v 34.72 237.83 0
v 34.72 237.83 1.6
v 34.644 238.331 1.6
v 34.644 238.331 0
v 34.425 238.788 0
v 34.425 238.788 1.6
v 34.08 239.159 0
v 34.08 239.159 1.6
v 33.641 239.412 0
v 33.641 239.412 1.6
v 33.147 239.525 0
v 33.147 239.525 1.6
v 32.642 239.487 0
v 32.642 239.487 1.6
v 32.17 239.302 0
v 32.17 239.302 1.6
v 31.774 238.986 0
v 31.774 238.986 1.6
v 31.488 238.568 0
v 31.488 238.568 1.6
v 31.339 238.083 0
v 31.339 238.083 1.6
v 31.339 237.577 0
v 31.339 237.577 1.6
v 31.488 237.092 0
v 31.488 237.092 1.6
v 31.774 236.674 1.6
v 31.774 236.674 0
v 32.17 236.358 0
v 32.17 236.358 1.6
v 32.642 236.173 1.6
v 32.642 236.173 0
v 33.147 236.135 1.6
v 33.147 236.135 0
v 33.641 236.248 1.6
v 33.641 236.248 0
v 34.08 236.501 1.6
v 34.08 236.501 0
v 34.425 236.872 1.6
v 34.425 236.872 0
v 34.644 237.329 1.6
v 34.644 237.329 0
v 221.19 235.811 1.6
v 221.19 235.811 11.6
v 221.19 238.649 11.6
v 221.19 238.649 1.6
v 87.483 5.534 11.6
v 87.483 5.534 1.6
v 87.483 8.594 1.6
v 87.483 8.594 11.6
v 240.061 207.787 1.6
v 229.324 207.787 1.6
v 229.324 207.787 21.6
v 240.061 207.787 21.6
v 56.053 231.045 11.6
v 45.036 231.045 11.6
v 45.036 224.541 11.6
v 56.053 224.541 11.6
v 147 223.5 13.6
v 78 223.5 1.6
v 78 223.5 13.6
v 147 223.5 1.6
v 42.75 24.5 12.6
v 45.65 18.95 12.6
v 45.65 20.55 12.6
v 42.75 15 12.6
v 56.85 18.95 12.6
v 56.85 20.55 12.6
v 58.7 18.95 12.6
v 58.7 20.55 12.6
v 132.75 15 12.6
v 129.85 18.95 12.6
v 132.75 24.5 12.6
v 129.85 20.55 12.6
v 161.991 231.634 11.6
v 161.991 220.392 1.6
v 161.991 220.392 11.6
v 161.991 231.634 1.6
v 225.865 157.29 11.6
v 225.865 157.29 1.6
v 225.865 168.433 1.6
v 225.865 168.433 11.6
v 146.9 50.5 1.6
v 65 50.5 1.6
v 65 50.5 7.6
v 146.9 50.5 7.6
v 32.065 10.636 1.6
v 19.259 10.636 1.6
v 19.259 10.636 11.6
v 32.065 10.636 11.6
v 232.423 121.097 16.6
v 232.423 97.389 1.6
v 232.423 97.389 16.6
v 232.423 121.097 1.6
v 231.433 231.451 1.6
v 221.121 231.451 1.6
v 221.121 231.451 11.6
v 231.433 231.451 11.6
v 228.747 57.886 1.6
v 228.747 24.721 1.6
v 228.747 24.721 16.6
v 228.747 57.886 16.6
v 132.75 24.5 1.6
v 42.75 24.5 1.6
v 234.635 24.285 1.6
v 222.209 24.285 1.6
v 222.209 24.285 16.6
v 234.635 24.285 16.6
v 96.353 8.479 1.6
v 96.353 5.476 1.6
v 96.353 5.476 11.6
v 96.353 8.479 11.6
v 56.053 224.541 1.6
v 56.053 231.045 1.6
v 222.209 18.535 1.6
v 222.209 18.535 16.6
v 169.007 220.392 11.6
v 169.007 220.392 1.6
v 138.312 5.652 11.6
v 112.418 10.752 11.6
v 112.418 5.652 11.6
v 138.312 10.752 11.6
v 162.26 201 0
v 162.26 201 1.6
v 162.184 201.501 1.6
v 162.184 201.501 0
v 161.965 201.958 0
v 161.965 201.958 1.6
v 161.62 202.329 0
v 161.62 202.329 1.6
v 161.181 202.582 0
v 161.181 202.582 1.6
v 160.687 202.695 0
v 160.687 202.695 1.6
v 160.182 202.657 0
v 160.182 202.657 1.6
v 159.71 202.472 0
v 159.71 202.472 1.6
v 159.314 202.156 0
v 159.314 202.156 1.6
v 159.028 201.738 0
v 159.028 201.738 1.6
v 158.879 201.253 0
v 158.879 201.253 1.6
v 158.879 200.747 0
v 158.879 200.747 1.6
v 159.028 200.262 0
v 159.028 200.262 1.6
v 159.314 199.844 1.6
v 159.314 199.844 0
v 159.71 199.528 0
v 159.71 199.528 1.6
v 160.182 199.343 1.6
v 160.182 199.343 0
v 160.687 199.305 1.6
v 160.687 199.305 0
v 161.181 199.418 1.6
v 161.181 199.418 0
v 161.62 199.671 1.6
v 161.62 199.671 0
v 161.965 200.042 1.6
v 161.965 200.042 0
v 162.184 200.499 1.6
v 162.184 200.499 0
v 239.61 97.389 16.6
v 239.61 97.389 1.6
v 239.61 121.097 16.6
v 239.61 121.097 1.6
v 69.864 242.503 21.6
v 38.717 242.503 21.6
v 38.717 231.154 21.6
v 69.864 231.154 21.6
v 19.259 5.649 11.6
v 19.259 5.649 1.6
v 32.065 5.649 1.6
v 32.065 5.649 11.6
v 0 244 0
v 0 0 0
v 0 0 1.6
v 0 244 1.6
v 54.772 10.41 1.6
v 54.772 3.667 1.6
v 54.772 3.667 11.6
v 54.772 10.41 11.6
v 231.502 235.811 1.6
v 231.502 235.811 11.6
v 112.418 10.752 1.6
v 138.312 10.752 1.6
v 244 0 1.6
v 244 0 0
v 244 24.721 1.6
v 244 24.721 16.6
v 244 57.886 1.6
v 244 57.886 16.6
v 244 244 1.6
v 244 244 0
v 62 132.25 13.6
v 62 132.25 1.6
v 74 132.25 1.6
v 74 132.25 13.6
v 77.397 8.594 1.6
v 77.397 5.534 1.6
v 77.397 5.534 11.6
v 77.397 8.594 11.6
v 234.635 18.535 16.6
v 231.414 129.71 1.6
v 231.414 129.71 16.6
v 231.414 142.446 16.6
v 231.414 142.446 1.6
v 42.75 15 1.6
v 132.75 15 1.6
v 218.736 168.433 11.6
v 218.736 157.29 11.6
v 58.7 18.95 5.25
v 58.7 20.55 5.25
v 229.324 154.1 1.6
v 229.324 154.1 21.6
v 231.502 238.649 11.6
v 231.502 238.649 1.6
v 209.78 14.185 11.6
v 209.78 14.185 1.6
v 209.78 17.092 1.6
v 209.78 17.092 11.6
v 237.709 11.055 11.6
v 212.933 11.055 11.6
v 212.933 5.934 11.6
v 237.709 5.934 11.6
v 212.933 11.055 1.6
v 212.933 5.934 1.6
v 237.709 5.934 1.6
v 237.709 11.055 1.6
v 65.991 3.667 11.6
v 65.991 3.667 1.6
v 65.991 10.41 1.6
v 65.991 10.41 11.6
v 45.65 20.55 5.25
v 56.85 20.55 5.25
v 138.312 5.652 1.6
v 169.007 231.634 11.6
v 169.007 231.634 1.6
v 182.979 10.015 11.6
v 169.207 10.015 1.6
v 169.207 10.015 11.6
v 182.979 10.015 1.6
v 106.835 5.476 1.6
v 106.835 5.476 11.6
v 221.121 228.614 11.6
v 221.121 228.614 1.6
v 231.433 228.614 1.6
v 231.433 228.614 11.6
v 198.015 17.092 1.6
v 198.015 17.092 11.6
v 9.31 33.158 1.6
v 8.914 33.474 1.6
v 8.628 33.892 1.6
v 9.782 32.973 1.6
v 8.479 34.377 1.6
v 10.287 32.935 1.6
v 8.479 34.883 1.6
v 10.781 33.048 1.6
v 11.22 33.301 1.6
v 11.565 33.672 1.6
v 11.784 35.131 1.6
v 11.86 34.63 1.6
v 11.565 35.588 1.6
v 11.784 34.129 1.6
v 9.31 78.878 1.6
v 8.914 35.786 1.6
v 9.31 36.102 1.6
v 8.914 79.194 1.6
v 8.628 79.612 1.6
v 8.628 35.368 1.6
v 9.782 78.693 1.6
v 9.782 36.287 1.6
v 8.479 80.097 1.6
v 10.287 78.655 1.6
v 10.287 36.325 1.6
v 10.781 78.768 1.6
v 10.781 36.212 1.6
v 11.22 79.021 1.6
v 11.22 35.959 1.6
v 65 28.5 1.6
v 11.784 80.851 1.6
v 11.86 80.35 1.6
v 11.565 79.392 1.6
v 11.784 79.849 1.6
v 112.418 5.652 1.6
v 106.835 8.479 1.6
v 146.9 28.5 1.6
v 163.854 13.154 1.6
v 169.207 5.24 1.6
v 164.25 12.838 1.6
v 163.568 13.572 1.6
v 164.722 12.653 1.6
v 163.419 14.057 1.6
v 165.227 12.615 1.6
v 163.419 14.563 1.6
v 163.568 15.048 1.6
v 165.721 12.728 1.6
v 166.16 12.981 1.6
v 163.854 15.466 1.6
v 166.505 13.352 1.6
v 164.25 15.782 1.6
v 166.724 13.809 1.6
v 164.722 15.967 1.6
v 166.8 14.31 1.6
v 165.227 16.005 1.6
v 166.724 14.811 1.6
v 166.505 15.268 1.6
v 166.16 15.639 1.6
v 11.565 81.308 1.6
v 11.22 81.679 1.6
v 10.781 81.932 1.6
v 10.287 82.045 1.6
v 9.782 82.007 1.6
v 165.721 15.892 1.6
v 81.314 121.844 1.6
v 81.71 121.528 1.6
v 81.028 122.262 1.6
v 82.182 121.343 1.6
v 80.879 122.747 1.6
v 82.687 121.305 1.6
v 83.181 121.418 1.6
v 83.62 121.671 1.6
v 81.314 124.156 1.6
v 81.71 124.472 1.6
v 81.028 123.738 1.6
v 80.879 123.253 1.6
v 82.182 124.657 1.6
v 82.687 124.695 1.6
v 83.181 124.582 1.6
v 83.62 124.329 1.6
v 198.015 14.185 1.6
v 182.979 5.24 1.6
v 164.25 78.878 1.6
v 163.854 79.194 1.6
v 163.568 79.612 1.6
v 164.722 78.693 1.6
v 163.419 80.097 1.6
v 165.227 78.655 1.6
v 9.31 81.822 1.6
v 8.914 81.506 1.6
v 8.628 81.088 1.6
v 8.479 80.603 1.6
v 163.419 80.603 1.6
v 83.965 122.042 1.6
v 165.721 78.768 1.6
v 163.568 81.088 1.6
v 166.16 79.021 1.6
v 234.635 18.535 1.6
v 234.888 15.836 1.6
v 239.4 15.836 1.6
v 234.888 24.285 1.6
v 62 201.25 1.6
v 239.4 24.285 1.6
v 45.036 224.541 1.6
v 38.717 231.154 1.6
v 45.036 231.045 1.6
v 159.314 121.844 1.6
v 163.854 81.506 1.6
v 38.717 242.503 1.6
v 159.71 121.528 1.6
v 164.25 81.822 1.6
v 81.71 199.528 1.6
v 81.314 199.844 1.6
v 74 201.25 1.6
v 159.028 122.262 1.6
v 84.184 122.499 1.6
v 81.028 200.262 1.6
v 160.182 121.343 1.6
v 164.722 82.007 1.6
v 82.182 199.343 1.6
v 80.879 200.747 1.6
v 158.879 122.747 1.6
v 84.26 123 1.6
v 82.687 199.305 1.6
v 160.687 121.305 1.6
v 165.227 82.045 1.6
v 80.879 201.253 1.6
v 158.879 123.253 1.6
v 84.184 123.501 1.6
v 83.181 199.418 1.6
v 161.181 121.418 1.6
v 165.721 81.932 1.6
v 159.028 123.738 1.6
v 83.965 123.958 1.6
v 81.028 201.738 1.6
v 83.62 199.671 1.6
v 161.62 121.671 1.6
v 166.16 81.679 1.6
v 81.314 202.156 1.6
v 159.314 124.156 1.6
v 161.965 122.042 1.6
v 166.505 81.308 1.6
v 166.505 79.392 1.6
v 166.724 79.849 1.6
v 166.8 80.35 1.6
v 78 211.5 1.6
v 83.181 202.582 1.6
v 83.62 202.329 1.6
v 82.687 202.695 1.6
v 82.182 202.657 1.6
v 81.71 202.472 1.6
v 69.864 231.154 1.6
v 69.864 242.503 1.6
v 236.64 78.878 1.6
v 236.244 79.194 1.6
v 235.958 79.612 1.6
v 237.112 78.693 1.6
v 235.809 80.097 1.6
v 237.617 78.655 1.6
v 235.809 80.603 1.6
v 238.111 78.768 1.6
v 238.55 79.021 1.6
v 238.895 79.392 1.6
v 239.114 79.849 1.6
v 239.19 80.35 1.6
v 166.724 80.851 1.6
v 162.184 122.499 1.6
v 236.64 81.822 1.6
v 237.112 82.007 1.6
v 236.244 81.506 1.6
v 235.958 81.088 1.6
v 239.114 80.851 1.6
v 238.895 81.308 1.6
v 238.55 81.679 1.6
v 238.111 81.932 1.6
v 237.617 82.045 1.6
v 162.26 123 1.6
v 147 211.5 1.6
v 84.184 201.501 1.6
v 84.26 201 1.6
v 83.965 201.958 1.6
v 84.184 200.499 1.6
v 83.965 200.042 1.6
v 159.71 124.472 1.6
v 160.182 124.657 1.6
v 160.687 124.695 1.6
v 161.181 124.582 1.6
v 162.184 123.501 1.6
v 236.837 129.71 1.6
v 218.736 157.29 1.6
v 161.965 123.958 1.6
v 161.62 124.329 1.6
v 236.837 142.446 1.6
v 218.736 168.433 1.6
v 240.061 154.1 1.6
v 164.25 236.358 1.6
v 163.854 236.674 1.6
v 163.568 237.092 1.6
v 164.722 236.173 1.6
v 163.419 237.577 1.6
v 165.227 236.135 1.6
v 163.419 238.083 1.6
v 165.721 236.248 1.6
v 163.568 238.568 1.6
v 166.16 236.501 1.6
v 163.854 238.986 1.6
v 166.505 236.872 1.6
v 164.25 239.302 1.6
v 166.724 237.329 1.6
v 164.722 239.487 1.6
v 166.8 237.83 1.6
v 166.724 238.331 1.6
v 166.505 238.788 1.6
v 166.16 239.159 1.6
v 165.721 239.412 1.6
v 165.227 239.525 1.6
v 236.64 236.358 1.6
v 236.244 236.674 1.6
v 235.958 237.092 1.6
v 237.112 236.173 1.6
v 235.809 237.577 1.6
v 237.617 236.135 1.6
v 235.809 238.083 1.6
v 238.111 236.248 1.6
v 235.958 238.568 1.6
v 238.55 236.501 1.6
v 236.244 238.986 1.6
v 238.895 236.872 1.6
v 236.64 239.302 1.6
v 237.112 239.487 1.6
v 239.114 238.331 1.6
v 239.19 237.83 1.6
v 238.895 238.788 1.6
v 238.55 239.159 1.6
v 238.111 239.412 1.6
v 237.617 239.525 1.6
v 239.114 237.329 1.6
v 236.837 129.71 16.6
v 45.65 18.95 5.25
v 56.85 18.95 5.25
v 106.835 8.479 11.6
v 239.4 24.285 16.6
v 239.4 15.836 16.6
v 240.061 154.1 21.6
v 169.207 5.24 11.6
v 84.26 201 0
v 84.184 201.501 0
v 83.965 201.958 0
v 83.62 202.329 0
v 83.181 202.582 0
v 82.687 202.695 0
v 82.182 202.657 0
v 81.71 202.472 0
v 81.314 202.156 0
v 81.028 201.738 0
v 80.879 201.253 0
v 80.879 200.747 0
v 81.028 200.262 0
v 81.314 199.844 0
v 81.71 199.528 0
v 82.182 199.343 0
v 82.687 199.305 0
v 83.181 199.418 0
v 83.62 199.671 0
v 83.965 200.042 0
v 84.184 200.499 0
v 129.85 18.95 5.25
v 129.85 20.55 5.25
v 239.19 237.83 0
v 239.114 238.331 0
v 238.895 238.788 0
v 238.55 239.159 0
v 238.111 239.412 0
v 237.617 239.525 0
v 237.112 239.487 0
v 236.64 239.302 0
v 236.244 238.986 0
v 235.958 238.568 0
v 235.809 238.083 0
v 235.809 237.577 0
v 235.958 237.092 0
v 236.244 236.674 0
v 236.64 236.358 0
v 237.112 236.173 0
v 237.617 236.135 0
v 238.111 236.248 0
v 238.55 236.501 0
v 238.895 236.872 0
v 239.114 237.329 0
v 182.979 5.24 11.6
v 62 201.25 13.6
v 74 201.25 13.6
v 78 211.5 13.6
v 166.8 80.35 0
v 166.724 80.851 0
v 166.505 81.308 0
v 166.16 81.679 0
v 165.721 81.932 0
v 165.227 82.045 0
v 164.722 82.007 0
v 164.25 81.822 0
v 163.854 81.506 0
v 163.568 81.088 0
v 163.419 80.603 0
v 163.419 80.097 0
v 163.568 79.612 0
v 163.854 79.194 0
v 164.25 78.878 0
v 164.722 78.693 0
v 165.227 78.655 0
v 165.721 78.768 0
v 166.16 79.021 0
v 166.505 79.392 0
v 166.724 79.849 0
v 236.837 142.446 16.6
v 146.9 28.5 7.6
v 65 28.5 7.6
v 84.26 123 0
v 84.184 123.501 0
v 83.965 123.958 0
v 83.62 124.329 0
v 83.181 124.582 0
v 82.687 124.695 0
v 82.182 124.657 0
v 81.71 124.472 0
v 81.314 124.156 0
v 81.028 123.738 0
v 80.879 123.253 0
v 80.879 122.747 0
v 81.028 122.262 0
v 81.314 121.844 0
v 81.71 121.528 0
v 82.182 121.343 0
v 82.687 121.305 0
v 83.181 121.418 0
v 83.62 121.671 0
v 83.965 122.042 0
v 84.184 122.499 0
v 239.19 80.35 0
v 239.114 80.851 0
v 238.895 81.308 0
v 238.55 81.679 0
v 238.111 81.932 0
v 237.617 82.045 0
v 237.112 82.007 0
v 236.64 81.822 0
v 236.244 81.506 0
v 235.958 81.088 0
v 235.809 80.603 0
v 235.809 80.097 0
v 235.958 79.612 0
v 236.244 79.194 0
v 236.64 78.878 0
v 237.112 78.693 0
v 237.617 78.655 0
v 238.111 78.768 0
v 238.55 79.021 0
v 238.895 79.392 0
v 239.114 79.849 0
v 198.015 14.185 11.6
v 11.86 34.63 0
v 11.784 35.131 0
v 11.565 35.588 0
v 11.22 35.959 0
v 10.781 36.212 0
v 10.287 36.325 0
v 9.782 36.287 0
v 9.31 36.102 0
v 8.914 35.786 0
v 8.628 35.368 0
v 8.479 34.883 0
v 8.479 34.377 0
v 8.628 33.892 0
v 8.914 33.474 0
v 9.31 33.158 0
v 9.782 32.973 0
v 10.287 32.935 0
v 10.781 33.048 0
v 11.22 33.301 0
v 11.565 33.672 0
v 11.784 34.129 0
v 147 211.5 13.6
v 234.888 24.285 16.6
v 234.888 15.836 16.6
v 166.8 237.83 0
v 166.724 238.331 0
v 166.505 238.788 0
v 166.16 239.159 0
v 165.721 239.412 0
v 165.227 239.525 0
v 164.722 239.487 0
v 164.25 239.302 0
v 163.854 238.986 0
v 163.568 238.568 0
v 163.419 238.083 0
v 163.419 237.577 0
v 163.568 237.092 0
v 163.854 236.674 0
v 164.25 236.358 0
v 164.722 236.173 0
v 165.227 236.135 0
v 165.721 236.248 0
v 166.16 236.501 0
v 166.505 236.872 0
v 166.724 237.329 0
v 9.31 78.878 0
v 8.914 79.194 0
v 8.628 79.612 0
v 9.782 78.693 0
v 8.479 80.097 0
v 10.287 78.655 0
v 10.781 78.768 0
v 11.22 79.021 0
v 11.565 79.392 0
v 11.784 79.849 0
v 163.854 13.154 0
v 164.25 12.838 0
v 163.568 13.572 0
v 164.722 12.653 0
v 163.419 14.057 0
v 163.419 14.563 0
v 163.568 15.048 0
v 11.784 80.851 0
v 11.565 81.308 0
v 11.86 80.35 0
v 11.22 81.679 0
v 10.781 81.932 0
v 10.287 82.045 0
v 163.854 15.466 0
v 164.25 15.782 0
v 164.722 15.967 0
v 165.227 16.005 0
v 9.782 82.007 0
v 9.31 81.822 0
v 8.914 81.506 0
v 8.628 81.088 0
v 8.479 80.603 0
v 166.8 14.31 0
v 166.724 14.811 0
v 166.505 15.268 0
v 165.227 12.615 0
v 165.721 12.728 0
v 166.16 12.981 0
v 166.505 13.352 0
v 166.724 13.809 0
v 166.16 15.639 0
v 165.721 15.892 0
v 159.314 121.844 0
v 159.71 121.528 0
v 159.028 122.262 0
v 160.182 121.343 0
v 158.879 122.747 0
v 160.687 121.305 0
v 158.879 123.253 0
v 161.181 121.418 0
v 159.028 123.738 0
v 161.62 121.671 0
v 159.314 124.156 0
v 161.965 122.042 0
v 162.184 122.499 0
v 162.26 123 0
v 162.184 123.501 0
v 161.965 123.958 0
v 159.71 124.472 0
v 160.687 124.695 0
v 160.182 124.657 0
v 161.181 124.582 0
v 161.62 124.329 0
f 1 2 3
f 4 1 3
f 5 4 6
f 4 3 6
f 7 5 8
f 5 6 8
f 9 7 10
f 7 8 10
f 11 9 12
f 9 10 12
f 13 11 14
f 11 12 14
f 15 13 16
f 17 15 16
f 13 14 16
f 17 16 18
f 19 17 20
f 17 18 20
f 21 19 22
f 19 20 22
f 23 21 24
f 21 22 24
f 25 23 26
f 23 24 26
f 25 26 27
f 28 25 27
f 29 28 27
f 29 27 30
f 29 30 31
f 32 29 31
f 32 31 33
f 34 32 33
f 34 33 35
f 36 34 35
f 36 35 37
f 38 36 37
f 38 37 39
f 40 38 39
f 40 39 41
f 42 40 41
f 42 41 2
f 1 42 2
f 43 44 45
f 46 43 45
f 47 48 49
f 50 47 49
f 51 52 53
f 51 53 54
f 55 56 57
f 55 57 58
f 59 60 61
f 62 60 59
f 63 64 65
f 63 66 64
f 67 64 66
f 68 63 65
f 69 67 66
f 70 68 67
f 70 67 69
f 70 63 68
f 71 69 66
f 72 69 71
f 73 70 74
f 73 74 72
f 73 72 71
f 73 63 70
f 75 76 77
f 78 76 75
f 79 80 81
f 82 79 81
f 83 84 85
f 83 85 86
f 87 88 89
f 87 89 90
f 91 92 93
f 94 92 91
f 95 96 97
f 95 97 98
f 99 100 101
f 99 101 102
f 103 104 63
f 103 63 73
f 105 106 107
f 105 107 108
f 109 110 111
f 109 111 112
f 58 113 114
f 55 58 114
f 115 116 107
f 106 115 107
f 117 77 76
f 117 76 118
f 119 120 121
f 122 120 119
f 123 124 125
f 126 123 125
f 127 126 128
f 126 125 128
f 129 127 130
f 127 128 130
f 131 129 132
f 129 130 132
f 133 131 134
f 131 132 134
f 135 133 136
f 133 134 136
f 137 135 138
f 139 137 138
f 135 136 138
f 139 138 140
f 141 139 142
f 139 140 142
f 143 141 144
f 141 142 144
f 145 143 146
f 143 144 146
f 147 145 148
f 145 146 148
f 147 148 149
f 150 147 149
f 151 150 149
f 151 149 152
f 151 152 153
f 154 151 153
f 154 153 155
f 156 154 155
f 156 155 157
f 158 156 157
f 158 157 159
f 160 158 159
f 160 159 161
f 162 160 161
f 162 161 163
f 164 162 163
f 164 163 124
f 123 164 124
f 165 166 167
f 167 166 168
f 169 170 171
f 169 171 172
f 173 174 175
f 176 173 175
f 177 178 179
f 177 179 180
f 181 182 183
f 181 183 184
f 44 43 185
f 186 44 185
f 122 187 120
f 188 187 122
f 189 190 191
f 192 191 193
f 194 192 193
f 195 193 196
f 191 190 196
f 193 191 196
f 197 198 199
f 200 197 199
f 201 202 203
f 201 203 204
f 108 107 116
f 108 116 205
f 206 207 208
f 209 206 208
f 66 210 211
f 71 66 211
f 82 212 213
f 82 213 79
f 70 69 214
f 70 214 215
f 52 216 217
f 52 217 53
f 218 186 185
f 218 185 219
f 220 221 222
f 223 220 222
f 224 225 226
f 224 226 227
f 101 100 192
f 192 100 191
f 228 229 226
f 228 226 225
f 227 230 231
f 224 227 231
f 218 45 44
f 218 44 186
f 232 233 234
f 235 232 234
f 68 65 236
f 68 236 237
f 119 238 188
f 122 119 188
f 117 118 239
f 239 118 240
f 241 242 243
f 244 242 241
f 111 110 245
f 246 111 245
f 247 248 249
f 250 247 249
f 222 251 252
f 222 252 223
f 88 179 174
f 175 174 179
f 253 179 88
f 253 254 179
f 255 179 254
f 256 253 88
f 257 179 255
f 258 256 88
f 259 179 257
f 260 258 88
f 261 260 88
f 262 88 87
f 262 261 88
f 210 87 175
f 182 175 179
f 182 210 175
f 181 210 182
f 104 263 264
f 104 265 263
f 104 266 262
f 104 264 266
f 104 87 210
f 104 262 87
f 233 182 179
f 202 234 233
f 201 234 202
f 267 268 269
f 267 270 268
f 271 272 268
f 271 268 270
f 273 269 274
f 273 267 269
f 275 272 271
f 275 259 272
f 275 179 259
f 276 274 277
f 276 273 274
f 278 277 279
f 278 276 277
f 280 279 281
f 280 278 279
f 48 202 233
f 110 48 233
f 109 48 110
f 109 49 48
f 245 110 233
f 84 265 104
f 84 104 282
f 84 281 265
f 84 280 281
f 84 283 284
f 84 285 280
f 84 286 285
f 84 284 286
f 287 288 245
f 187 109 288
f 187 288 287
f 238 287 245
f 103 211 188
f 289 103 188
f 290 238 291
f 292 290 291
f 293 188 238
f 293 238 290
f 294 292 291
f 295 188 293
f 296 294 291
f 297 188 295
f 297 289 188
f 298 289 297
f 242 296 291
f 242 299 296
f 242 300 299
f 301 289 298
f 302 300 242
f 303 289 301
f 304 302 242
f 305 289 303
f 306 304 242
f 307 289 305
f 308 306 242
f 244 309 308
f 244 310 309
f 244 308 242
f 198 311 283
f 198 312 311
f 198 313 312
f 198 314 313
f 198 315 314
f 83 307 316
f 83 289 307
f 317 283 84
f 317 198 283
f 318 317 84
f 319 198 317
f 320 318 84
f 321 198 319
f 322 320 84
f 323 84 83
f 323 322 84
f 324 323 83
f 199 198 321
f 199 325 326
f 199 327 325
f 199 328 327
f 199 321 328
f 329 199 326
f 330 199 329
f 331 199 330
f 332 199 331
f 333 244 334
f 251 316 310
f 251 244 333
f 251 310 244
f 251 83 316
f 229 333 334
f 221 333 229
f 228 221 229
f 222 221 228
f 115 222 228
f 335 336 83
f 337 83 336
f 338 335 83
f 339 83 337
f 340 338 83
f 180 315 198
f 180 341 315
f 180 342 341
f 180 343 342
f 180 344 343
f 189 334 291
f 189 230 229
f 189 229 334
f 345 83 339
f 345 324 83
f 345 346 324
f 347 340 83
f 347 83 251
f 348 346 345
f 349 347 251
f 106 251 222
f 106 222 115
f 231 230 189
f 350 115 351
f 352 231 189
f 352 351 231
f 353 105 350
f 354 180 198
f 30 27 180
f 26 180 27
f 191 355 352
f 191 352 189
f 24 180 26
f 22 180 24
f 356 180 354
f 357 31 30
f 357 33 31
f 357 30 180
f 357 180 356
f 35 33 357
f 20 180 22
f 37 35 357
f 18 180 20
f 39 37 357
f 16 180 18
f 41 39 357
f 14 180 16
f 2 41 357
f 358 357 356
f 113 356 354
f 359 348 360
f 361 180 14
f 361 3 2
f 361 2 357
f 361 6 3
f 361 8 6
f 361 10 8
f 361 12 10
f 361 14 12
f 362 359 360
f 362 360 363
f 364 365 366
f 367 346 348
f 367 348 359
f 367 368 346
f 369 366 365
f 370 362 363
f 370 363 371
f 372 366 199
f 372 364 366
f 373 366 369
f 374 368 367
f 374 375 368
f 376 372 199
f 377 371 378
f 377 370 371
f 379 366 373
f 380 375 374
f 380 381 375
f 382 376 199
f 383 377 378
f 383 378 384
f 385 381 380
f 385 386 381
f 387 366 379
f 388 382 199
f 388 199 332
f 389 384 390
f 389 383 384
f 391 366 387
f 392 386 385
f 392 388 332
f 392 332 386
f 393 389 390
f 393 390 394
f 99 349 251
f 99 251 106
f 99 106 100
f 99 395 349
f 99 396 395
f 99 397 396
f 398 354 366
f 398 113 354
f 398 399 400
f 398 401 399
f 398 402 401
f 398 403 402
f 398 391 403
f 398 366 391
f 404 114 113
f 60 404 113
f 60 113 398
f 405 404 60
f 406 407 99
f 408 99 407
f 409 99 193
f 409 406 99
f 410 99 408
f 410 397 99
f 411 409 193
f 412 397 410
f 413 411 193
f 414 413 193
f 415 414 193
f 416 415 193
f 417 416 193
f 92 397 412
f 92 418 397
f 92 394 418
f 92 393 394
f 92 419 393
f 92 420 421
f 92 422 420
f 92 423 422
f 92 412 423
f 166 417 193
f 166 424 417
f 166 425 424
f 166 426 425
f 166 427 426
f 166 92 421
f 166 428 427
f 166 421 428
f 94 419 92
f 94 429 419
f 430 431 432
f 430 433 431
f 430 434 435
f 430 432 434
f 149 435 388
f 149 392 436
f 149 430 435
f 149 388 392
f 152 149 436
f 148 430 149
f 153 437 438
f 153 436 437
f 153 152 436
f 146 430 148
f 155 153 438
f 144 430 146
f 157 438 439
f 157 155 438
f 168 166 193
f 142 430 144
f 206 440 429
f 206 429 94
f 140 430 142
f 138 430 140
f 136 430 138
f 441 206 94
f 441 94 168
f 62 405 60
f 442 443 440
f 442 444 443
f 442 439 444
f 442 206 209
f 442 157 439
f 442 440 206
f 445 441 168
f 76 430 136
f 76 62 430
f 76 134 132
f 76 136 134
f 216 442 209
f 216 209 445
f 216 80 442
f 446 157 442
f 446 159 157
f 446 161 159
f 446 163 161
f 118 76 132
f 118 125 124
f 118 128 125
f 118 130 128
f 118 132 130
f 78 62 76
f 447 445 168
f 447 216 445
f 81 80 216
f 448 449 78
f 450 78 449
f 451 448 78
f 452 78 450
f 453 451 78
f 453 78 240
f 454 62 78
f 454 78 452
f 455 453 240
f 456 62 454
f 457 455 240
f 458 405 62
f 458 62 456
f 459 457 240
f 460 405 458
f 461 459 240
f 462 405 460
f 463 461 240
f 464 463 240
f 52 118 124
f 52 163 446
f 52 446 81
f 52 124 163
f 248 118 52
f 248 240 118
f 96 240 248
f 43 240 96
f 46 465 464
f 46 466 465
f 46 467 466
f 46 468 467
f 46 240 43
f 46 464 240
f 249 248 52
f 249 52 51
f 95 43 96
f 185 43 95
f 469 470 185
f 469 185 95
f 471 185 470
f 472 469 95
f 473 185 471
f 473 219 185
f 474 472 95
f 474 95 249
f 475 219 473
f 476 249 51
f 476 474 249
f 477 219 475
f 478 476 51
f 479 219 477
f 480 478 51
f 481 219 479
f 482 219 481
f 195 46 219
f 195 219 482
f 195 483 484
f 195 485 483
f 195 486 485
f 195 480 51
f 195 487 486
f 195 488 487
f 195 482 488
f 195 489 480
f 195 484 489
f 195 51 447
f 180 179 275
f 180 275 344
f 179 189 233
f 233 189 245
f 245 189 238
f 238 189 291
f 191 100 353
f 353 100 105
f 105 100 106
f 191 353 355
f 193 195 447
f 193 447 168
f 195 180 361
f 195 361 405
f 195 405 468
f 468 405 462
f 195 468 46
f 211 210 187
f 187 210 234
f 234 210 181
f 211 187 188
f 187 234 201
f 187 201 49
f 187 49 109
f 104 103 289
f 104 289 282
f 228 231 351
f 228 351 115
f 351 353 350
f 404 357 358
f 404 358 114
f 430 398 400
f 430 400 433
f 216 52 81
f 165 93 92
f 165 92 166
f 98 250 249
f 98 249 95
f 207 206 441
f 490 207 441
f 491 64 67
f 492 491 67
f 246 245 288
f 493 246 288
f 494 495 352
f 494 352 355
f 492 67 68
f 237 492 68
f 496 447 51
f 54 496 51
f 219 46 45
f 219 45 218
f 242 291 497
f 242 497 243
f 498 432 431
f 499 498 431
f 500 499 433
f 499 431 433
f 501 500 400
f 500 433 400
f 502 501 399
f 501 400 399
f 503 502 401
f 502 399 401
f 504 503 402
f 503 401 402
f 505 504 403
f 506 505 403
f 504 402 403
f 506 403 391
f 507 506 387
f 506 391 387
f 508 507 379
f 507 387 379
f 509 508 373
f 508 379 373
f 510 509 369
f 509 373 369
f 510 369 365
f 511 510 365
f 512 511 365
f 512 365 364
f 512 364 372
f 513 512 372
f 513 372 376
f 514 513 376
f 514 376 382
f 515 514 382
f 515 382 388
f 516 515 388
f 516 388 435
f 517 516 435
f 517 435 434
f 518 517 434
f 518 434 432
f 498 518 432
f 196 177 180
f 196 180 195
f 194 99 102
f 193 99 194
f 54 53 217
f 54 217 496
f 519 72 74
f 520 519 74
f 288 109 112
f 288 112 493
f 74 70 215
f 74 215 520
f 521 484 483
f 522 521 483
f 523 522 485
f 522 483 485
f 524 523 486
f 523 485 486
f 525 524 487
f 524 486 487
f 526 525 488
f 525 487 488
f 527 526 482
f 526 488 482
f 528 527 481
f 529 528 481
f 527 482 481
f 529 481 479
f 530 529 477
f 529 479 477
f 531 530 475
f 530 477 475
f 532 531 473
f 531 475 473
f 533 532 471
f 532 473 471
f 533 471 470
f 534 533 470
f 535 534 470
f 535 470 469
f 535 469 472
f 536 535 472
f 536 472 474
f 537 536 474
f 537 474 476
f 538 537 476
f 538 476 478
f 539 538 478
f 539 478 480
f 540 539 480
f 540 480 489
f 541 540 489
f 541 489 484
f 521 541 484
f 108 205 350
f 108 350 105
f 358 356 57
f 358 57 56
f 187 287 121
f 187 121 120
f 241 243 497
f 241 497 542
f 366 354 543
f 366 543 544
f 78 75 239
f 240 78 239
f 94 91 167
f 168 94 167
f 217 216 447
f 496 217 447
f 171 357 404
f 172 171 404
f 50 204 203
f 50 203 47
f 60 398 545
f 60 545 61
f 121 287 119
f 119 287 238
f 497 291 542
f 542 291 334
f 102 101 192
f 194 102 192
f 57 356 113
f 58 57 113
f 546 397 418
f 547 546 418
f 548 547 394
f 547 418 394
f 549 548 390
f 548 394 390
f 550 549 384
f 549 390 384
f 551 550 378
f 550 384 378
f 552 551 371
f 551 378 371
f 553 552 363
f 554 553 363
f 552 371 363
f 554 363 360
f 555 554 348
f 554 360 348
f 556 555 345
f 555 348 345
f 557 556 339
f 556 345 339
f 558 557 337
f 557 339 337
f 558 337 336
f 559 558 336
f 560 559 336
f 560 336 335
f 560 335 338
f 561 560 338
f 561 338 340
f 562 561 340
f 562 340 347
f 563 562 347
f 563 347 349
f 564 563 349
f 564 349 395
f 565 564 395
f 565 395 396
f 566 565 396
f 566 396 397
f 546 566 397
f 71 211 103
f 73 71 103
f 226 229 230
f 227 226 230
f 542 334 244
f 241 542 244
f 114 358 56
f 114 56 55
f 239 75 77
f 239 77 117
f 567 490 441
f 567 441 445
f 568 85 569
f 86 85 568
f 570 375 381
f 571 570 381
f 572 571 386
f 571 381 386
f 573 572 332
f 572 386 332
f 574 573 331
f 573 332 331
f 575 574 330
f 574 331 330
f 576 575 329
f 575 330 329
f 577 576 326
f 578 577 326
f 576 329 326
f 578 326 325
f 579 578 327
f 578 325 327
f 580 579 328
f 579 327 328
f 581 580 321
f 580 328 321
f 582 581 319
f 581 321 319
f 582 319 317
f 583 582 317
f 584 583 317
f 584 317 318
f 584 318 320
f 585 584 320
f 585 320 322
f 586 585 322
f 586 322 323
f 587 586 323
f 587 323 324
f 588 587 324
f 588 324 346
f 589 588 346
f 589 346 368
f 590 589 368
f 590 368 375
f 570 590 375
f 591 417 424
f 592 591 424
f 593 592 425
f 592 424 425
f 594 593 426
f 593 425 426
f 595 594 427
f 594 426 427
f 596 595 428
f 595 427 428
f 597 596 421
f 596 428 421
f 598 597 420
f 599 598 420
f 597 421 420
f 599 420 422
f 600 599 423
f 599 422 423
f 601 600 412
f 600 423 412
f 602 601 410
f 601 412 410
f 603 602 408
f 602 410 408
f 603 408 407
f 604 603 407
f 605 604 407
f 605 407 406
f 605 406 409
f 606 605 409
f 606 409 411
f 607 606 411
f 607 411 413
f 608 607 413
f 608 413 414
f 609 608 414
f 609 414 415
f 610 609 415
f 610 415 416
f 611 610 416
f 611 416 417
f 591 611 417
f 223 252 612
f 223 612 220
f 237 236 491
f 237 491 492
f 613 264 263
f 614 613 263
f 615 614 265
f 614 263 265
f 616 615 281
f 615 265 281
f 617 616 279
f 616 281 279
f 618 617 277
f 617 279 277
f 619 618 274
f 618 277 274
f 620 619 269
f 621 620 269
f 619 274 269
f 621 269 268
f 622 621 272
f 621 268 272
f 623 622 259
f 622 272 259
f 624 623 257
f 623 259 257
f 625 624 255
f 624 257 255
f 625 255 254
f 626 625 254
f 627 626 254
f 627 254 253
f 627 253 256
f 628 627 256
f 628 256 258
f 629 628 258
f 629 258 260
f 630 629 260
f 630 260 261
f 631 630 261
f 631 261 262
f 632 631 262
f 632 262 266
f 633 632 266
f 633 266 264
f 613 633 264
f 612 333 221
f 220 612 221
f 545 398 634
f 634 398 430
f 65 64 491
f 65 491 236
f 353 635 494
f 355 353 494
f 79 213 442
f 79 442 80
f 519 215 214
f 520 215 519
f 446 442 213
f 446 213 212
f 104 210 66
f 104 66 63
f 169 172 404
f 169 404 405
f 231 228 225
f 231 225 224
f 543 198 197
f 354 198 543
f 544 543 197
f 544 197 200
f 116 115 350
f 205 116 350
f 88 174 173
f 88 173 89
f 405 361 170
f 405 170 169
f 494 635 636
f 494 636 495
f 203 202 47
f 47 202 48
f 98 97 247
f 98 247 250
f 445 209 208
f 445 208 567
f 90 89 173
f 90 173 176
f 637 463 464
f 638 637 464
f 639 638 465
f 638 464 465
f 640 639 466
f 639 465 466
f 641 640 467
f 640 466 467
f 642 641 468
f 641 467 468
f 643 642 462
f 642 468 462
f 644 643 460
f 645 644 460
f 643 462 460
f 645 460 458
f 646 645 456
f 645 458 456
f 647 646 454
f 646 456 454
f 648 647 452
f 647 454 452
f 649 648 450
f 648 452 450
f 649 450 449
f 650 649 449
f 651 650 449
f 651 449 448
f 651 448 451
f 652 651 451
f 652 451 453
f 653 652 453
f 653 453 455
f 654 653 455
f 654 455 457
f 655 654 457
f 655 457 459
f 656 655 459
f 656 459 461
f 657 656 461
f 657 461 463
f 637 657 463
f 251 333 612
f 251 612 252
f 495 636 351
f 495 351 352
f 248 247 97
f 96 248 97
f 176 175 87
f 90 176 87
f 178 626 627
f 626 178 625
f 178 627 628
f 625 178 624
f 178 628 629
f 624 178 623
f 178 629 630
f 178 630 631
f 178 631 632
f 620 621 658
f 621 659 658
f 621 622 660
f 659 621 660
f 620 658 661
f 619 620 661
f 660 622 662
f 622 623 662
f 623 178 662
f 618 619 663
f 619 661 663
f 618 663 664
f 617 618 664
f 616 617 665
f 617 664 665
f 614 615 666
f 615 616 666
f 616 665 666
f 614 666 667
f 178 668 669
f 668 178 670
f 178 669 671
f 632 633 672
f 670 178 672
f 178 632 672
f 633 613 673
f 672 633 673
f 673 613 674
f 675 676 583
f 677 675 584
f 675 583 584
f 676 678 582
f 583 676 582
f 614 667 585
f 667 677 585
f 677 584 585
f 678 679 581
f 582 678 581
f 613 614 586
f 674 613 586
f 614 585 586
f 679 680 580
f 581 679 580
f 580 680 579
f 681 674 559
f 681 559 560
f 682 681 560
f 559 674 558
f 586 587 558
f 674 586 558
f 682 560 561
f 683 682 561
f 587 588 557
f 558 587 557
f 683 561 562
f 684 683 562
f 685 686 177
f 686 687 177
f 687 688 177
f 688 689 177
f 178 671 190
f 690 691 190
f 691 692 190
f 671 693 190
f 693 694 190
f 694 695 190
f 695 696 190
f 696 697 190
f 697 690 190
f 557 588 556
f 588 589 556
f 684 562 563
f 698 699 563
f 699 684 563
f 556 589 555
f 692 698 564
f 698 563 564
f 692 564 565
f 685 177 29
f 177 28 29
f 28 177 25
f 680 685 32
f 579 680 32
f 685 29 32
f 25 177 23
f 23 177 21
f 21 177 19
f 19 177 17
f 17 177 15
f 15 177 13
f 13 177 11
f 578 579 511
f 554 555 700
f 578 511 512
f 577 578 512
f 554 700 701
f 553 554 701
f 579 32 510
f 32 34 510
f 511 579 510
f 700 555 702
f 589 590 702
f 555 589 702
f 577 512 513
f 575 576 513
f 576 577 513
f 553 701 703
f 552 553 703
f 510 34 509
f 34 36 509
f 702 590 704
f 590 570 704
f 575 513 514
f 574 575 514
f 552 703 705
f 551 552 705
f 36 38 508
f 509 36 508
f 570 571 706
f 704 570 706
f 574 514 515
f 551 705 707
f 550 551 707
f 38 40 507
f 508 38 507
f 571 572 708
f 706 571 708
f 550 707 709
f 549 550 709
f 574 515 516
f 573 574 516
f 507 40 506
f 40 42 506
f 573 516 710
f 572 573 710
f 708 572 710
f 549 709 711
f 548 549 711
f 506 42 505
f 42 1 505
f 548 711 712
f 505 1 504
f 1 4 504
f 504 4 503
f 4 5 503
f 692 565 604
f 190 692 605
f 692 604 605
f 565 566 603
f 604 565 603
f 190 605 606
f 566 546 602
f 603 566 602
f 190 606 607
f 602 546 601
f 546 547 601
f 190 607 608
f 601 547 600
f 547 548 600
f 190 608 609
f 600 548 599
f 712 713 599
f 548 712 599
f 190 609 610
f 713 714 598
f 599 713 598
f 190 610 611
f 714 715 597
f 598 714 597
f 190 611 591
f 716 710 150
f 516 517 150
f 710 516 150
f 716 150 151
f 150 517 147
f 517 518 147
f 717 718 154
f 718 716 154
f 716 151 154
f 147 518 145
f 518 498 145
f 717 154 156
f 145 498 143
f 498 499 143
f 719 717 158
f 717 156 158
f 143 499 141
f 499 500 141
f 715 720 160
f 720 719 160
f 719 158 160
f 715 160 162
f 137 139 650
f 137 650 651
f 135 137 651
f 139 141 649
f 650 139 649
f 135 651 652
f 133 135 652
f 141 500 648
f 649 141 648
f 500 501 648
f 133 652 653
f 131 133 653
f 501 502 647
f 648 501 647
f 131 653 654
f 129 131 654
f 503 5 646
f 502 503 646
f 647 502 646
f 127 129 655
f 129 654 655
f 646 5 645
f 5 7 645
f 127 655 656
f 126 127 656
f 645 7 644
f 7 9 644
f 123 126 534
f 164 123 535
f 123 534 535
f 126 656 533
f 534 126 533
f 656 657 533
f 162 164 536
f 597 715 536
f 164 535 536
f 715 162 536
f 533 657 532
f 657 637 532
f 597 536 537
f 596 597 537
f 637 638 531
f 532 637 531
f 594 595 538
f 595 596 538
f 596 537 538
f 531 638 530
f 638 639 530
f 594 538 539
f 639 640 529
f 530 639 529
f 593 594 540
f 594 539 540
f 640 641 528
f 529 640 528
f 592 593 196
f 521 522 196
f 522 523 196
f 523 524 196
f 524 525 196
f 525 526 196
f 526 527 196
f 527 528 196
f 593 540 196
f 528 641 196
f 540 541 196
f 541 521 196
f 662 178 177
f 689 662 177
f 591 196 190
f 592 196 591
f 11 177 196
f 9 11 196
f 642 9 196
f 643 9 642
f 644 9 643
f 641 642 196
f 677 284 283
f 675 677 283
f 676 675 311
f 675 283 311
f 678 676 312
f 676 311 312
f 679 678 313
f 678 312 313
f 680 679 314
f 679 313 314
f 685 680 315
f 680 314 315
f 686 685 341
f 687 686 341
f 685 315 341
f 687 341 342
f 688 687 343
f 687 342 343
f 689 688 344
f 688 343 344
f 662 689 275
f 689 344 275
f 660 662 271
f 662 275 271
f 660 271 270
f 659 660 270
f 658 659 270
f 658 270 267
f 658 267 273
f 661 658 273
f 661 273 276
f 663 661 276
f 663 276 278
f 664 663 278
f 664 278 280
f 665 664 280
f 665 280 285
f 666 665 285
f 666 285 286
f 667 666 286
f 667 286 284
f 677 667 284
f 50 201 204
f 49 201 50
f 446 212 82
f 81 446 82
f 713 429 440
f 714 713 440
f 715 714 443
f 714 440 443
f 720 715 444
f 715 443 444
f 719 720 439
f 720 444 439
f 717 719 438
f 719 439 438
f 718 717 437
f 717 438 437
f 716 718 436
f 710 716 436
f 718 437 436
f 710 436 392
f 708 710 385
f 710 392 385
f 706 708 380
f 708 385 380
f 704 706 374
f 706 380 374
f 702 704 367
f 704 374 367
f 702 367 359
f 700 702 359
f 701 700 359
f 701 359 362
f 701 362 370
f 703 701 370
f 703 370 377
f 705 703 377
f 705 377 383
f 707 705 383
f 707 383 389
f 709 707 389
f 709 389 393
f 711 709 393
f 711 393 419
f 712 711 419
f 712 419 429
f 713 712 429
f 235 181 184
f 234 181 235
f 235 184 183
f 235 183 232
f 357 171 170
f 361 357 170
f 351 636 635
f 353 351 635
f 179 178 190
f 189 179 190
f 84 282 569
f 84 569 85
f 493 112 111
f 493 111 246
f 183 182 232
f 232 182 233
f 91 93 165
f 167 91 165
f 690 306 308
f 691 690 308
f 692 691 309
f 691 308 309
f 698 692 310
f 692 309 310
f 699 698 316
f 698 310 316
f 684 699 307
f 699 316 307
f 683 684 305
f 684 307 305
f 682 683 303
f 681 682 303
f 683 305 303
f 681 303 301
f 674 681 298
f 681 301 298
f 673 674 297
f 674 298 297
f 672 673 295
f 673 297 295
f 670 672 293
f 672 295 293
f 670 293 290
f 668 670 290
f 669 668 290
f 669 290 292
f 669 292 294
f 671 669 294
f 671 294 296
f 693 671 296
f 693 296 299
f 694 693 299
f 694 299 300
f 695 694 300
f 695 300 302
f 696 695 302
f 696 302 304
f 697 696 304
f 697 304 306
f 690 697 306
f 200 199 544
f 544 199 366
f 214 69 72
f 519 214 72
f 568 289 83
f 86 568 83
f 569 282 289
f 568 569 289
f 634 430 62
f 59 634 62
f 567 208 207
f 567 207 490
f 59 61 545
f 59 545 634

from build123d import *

# Parameters (mm, degrees)
SKETCH083_W     = 244
SKETCH083_H     = 244
PAD053_DEPTH    = 1.6
SKETCH084_W     = 12.805552
SKETCH084_H     = 4.986233
SKETCH084_W_2   = 11.219025
SKETCH084_H_2   = 6.742746
SKETCH084_W_3   = 10.085793
SKETCH084_H_3   = 3.059733
SKETCH084_W_4   = 10.482422
SKETCH084_H_4   = 3.003072
SKETCH084_W_5   = 25.894417
SKETCH084_H_5   = 5.099556
SKETCH084_W_6   = 13.772156
SKETCH084_H_6   = 4.775269
SKETCH084_W_7   = 24.776046
SKETCH084_H_7   = 5.121302
SKETCH084_W_8   = 11.765168
SKETCH084_H_8   = 2.906684
SKETCH084_W_9   = 7.128295
SKETCH084_H_9   = 11.142288
SKETCH084_W_10  = 10.311813
SKETCH084_H_10  = 2.837479
SKETCH084_W_11  = 10.311814
SKETCH084_H_11  = 2.837478
SKETCH084_W_12  = 7.015946
SKETCH084_H_12  = 11.242416
SKETCH084_W_13  = 11.016556
SKETCH084_H_13  = 6.50441
PAD054_DEPTH    = 10
SKETCH085_W     = 15.253067
SKETCH085_H     = 33.165085
SKETCH085_W_2   = 7.187866
SKETCH085_H_2   = 23.70736
SKETCH085_W_3   = 5.42244
SKETCH085_H_3   = 12.736404
SKETCH085_W_4   = 12.425812
SKETCH085_H_4   = 5.750149
SKETCH085_W_5   = 4.511801
SKETCH085_H_5   = 8.449646
PAD055_DEPTH    = 15
SKETCH086_W     = 10.737412
SKETCH086_H     = 53.687088
SKETCH086_W_2   = 31.147434
SKETCH086_H_2   = 11.349274
PAD056_DEPTH    = 20
SKETCH089_W     = 90
SKETCH089_H     = 9.5
PAD059_DEPTH    = 11
SKETCH090_W     = 81.9
SKETCH090_H     = 22
PAD061_DEPTH    = 6
SKETCH100_R     = 1.7
HOLE_DEPTH      = 1.601
SKETCH_W        = 69
SKETCH_H        = 12
SKETCH_W_2      = 12
SKETCH_H_2      = 69
PAD_DEPTH       = 12
SKETCH116_W     = 11.2
SKETCH116_H     = 1.6
SKETCH116_W_2   = 71.15
POCKET029_DEPTH = 7.35


with BuildPart() as part:
    # Sketch083 → Pad053 (new body)
    with BuildSketch(Plane.XY):
        with Locations((122, 122)):
            Rectangle(SKETCH083_W, SKETCH083_H)
    extrude(amount=PAD053_DEPTH)

    # Sketch084 (on Face6 of Pad053) → Pad054 (join)
    with BuildSketch(Plane.XY.offset(1.6)):
        with Locations((25.66175, 8.1425655)):
            Rectangle(SKETCH084_W, SKETCH084_H)
        with Locations((60.3814395, 7.038229)):
            Rectangle(SKETCH084_W_2, SKETCH084_H_2)
        with Locations((82.4398765, 7.0638115)):
            Rectangle(SKETCH084_W_3, SKETCH084_H_3)
        with Locations((101.593994, 6.977586)):
            Rectangle(SKETCH084_W_4, SKETCH084_H_4)
        with Locations((125.3647115, 8.201877)):
            Rectangle(SKETCH084_W_5, SKETCH084_H_5)
        with Locations((176.093216, 7.6274735)):
            Rectangle(SKETCH084_W_6, SKETCH084_H_6)
        with Locations((225.320961, 8.494646)):
            Rectangle(SKETCH084_W_7, SKETCH084_H_7)
        with Locations((203.897812, 15.63834)):
            Rectangle(SKETCH084_W_8, SKETCH084_H_8)
        with Locations((222.3003845, 162.861565)):
            Rectangle(SKETCH084_W_9, SKETCH084_H_9)
        with Locations((226.3459395, 237.2302015)):
            Rectangle(SKETCH084_W_10, SKETCH084_H_10)
        with Locations((226.276741, 230.032692)):
            Rectangle(SKETCH084_W_11, SKETCH084_H_11)
        with Locations((165.498787, 226.013008)):
            Rectangle(SKETCH084_W_12, SKETCH084_H_12)
        with Locations((50.544289, 227.792839)):
            Rectangle(SKETCH084_W_13, SKETCH084_H_13)
    extrude(amount=PAD054_DEPTH)

    # Sketch085 (on Face5 of Pad054) → Pad055 (join)
    with BuildSketch(Plane.XY.offset(1.6)):
        with Locations((236.3734665, 41.3033025)):
            Rectangle(SKETCH085_W, SKETCH085_H)
        with Locations((236.016449, 109.243)):
            Rectangle(SKETCH085_W_2, SKETCH085_H_2)
        with Locations((234.125511, 136.078026)):
            Rectangle(SKETCH085_W_3, SKETCH085_H_3)
        with Locations((228.421982, 21.4103315)):
            Rectangle(SKETCH085_W_4, SKETCH085_H_4)
        with Locations((237.1440995, 20.060583)):
            Rectangle(SKETCH085_W_5, SKETCH085_H_5)
    extrude(amount=PAD055_DEPTH)

    # Sketch086 (on Face5 of Pad055) → Pad056 (join)
    with BuildSketch(Plane.XY.offset(1.6)):
        with Locations((234.692436, 180.943504)):
            Rectangle(SKETCH086_W, SKETCH086_H)
        with Locations((54.290396, 236.828354)):
            Rectangle(SKETCH086_W_2, SKETCH086_H_2)
    extrude(amount=PAD056_DEPTH)

    # Sketch089 → Pad059 (join)
    with BuildSketch(Plane.XY.offset(1.6)):
        with Locations((87.75, 19.75)):
            Rectangle(SKETCH089_W, SKETCH089_H)
    extrude(amount=PAD059_DEPTH)

    # Sketch090 (on Face5 of Pad059) → Pad061 (join)
    with BuildSketch(Plane.XY.offset(1.6)):
        with Locations((105.95, 39.5)):
            Rectangle(SKETCH090_W, SKETCH090_H)
    extrude(amount=PAD061_DEPTH)

    # Sketch100 → Hole (cut, through all)
    with BuildSketch(Plane.XY.offset(1.6)):
        with Locations((82.56, 123)):
            Circle(SKETCH100_R)
        with Locations((160.56, 123)):
            Circle(SKETCH100_R)
        with Locations((160.56, 201)):
            Circle(SKETCH100_R)
        with Locations((82.56, 201)):
            Circle(SKETCH100_R)
        with Locations((33.02, 237.83)):
            Circle(SKETCH100_R)
        with Locations((165.1, 237.83)):
            Circle(SKETCH100_R)
        with Locations((237.49, 237.83)):
            Circle(SKETCH100_R)
        with Locations((237.49, 80.35)):
            Circle(SKETCH100_R)
        with Locations((165.1, 80.35)):
            Circle(SKETCH100_R)
        with Locations((165.1, 14.31)):
            Circle(SKETCH100_R)
        with Locations((10.16, 34.63)):
            Circle(SKETCH100_R)
        with Locations((10.16, 80.35)):
            Circle(SKETCH100_R)
    extrude(amount=-HOLE_DEPTH, mode=Mode.SUBTRACT)

    # Sketch (on Face5 of Pad061) → Pad (join)
    with BuildSketch(Plane.XY.offset(1.6)):
        with Locations((112.5, 217.5)):
            Rectangle(SKETCH_W, SKETCH_H)
        with Locations((68, 166.75)):
            Rectangle(SKETCH_W_2, SKETCH_H_2)
    extrude(amount=PAD_DEPTH)

    # Sketch116 (on Face119 of Pad) → Pocket029 (cut)
    with BuildSketch(Plane.XY.offset(12.6)):
        with Locations((51.25, 19.75)):
            Rectangle(SKETCH116_W, SKETCH116_H)
        with Locations((94.275, 19.75)):
            Rectangle(SKETCH116_W_2, SKETCH116_H)
    extrude(amount=-POCKET029_DEPTH, mode=Mode.SUBTRACT)


solid = part.part
